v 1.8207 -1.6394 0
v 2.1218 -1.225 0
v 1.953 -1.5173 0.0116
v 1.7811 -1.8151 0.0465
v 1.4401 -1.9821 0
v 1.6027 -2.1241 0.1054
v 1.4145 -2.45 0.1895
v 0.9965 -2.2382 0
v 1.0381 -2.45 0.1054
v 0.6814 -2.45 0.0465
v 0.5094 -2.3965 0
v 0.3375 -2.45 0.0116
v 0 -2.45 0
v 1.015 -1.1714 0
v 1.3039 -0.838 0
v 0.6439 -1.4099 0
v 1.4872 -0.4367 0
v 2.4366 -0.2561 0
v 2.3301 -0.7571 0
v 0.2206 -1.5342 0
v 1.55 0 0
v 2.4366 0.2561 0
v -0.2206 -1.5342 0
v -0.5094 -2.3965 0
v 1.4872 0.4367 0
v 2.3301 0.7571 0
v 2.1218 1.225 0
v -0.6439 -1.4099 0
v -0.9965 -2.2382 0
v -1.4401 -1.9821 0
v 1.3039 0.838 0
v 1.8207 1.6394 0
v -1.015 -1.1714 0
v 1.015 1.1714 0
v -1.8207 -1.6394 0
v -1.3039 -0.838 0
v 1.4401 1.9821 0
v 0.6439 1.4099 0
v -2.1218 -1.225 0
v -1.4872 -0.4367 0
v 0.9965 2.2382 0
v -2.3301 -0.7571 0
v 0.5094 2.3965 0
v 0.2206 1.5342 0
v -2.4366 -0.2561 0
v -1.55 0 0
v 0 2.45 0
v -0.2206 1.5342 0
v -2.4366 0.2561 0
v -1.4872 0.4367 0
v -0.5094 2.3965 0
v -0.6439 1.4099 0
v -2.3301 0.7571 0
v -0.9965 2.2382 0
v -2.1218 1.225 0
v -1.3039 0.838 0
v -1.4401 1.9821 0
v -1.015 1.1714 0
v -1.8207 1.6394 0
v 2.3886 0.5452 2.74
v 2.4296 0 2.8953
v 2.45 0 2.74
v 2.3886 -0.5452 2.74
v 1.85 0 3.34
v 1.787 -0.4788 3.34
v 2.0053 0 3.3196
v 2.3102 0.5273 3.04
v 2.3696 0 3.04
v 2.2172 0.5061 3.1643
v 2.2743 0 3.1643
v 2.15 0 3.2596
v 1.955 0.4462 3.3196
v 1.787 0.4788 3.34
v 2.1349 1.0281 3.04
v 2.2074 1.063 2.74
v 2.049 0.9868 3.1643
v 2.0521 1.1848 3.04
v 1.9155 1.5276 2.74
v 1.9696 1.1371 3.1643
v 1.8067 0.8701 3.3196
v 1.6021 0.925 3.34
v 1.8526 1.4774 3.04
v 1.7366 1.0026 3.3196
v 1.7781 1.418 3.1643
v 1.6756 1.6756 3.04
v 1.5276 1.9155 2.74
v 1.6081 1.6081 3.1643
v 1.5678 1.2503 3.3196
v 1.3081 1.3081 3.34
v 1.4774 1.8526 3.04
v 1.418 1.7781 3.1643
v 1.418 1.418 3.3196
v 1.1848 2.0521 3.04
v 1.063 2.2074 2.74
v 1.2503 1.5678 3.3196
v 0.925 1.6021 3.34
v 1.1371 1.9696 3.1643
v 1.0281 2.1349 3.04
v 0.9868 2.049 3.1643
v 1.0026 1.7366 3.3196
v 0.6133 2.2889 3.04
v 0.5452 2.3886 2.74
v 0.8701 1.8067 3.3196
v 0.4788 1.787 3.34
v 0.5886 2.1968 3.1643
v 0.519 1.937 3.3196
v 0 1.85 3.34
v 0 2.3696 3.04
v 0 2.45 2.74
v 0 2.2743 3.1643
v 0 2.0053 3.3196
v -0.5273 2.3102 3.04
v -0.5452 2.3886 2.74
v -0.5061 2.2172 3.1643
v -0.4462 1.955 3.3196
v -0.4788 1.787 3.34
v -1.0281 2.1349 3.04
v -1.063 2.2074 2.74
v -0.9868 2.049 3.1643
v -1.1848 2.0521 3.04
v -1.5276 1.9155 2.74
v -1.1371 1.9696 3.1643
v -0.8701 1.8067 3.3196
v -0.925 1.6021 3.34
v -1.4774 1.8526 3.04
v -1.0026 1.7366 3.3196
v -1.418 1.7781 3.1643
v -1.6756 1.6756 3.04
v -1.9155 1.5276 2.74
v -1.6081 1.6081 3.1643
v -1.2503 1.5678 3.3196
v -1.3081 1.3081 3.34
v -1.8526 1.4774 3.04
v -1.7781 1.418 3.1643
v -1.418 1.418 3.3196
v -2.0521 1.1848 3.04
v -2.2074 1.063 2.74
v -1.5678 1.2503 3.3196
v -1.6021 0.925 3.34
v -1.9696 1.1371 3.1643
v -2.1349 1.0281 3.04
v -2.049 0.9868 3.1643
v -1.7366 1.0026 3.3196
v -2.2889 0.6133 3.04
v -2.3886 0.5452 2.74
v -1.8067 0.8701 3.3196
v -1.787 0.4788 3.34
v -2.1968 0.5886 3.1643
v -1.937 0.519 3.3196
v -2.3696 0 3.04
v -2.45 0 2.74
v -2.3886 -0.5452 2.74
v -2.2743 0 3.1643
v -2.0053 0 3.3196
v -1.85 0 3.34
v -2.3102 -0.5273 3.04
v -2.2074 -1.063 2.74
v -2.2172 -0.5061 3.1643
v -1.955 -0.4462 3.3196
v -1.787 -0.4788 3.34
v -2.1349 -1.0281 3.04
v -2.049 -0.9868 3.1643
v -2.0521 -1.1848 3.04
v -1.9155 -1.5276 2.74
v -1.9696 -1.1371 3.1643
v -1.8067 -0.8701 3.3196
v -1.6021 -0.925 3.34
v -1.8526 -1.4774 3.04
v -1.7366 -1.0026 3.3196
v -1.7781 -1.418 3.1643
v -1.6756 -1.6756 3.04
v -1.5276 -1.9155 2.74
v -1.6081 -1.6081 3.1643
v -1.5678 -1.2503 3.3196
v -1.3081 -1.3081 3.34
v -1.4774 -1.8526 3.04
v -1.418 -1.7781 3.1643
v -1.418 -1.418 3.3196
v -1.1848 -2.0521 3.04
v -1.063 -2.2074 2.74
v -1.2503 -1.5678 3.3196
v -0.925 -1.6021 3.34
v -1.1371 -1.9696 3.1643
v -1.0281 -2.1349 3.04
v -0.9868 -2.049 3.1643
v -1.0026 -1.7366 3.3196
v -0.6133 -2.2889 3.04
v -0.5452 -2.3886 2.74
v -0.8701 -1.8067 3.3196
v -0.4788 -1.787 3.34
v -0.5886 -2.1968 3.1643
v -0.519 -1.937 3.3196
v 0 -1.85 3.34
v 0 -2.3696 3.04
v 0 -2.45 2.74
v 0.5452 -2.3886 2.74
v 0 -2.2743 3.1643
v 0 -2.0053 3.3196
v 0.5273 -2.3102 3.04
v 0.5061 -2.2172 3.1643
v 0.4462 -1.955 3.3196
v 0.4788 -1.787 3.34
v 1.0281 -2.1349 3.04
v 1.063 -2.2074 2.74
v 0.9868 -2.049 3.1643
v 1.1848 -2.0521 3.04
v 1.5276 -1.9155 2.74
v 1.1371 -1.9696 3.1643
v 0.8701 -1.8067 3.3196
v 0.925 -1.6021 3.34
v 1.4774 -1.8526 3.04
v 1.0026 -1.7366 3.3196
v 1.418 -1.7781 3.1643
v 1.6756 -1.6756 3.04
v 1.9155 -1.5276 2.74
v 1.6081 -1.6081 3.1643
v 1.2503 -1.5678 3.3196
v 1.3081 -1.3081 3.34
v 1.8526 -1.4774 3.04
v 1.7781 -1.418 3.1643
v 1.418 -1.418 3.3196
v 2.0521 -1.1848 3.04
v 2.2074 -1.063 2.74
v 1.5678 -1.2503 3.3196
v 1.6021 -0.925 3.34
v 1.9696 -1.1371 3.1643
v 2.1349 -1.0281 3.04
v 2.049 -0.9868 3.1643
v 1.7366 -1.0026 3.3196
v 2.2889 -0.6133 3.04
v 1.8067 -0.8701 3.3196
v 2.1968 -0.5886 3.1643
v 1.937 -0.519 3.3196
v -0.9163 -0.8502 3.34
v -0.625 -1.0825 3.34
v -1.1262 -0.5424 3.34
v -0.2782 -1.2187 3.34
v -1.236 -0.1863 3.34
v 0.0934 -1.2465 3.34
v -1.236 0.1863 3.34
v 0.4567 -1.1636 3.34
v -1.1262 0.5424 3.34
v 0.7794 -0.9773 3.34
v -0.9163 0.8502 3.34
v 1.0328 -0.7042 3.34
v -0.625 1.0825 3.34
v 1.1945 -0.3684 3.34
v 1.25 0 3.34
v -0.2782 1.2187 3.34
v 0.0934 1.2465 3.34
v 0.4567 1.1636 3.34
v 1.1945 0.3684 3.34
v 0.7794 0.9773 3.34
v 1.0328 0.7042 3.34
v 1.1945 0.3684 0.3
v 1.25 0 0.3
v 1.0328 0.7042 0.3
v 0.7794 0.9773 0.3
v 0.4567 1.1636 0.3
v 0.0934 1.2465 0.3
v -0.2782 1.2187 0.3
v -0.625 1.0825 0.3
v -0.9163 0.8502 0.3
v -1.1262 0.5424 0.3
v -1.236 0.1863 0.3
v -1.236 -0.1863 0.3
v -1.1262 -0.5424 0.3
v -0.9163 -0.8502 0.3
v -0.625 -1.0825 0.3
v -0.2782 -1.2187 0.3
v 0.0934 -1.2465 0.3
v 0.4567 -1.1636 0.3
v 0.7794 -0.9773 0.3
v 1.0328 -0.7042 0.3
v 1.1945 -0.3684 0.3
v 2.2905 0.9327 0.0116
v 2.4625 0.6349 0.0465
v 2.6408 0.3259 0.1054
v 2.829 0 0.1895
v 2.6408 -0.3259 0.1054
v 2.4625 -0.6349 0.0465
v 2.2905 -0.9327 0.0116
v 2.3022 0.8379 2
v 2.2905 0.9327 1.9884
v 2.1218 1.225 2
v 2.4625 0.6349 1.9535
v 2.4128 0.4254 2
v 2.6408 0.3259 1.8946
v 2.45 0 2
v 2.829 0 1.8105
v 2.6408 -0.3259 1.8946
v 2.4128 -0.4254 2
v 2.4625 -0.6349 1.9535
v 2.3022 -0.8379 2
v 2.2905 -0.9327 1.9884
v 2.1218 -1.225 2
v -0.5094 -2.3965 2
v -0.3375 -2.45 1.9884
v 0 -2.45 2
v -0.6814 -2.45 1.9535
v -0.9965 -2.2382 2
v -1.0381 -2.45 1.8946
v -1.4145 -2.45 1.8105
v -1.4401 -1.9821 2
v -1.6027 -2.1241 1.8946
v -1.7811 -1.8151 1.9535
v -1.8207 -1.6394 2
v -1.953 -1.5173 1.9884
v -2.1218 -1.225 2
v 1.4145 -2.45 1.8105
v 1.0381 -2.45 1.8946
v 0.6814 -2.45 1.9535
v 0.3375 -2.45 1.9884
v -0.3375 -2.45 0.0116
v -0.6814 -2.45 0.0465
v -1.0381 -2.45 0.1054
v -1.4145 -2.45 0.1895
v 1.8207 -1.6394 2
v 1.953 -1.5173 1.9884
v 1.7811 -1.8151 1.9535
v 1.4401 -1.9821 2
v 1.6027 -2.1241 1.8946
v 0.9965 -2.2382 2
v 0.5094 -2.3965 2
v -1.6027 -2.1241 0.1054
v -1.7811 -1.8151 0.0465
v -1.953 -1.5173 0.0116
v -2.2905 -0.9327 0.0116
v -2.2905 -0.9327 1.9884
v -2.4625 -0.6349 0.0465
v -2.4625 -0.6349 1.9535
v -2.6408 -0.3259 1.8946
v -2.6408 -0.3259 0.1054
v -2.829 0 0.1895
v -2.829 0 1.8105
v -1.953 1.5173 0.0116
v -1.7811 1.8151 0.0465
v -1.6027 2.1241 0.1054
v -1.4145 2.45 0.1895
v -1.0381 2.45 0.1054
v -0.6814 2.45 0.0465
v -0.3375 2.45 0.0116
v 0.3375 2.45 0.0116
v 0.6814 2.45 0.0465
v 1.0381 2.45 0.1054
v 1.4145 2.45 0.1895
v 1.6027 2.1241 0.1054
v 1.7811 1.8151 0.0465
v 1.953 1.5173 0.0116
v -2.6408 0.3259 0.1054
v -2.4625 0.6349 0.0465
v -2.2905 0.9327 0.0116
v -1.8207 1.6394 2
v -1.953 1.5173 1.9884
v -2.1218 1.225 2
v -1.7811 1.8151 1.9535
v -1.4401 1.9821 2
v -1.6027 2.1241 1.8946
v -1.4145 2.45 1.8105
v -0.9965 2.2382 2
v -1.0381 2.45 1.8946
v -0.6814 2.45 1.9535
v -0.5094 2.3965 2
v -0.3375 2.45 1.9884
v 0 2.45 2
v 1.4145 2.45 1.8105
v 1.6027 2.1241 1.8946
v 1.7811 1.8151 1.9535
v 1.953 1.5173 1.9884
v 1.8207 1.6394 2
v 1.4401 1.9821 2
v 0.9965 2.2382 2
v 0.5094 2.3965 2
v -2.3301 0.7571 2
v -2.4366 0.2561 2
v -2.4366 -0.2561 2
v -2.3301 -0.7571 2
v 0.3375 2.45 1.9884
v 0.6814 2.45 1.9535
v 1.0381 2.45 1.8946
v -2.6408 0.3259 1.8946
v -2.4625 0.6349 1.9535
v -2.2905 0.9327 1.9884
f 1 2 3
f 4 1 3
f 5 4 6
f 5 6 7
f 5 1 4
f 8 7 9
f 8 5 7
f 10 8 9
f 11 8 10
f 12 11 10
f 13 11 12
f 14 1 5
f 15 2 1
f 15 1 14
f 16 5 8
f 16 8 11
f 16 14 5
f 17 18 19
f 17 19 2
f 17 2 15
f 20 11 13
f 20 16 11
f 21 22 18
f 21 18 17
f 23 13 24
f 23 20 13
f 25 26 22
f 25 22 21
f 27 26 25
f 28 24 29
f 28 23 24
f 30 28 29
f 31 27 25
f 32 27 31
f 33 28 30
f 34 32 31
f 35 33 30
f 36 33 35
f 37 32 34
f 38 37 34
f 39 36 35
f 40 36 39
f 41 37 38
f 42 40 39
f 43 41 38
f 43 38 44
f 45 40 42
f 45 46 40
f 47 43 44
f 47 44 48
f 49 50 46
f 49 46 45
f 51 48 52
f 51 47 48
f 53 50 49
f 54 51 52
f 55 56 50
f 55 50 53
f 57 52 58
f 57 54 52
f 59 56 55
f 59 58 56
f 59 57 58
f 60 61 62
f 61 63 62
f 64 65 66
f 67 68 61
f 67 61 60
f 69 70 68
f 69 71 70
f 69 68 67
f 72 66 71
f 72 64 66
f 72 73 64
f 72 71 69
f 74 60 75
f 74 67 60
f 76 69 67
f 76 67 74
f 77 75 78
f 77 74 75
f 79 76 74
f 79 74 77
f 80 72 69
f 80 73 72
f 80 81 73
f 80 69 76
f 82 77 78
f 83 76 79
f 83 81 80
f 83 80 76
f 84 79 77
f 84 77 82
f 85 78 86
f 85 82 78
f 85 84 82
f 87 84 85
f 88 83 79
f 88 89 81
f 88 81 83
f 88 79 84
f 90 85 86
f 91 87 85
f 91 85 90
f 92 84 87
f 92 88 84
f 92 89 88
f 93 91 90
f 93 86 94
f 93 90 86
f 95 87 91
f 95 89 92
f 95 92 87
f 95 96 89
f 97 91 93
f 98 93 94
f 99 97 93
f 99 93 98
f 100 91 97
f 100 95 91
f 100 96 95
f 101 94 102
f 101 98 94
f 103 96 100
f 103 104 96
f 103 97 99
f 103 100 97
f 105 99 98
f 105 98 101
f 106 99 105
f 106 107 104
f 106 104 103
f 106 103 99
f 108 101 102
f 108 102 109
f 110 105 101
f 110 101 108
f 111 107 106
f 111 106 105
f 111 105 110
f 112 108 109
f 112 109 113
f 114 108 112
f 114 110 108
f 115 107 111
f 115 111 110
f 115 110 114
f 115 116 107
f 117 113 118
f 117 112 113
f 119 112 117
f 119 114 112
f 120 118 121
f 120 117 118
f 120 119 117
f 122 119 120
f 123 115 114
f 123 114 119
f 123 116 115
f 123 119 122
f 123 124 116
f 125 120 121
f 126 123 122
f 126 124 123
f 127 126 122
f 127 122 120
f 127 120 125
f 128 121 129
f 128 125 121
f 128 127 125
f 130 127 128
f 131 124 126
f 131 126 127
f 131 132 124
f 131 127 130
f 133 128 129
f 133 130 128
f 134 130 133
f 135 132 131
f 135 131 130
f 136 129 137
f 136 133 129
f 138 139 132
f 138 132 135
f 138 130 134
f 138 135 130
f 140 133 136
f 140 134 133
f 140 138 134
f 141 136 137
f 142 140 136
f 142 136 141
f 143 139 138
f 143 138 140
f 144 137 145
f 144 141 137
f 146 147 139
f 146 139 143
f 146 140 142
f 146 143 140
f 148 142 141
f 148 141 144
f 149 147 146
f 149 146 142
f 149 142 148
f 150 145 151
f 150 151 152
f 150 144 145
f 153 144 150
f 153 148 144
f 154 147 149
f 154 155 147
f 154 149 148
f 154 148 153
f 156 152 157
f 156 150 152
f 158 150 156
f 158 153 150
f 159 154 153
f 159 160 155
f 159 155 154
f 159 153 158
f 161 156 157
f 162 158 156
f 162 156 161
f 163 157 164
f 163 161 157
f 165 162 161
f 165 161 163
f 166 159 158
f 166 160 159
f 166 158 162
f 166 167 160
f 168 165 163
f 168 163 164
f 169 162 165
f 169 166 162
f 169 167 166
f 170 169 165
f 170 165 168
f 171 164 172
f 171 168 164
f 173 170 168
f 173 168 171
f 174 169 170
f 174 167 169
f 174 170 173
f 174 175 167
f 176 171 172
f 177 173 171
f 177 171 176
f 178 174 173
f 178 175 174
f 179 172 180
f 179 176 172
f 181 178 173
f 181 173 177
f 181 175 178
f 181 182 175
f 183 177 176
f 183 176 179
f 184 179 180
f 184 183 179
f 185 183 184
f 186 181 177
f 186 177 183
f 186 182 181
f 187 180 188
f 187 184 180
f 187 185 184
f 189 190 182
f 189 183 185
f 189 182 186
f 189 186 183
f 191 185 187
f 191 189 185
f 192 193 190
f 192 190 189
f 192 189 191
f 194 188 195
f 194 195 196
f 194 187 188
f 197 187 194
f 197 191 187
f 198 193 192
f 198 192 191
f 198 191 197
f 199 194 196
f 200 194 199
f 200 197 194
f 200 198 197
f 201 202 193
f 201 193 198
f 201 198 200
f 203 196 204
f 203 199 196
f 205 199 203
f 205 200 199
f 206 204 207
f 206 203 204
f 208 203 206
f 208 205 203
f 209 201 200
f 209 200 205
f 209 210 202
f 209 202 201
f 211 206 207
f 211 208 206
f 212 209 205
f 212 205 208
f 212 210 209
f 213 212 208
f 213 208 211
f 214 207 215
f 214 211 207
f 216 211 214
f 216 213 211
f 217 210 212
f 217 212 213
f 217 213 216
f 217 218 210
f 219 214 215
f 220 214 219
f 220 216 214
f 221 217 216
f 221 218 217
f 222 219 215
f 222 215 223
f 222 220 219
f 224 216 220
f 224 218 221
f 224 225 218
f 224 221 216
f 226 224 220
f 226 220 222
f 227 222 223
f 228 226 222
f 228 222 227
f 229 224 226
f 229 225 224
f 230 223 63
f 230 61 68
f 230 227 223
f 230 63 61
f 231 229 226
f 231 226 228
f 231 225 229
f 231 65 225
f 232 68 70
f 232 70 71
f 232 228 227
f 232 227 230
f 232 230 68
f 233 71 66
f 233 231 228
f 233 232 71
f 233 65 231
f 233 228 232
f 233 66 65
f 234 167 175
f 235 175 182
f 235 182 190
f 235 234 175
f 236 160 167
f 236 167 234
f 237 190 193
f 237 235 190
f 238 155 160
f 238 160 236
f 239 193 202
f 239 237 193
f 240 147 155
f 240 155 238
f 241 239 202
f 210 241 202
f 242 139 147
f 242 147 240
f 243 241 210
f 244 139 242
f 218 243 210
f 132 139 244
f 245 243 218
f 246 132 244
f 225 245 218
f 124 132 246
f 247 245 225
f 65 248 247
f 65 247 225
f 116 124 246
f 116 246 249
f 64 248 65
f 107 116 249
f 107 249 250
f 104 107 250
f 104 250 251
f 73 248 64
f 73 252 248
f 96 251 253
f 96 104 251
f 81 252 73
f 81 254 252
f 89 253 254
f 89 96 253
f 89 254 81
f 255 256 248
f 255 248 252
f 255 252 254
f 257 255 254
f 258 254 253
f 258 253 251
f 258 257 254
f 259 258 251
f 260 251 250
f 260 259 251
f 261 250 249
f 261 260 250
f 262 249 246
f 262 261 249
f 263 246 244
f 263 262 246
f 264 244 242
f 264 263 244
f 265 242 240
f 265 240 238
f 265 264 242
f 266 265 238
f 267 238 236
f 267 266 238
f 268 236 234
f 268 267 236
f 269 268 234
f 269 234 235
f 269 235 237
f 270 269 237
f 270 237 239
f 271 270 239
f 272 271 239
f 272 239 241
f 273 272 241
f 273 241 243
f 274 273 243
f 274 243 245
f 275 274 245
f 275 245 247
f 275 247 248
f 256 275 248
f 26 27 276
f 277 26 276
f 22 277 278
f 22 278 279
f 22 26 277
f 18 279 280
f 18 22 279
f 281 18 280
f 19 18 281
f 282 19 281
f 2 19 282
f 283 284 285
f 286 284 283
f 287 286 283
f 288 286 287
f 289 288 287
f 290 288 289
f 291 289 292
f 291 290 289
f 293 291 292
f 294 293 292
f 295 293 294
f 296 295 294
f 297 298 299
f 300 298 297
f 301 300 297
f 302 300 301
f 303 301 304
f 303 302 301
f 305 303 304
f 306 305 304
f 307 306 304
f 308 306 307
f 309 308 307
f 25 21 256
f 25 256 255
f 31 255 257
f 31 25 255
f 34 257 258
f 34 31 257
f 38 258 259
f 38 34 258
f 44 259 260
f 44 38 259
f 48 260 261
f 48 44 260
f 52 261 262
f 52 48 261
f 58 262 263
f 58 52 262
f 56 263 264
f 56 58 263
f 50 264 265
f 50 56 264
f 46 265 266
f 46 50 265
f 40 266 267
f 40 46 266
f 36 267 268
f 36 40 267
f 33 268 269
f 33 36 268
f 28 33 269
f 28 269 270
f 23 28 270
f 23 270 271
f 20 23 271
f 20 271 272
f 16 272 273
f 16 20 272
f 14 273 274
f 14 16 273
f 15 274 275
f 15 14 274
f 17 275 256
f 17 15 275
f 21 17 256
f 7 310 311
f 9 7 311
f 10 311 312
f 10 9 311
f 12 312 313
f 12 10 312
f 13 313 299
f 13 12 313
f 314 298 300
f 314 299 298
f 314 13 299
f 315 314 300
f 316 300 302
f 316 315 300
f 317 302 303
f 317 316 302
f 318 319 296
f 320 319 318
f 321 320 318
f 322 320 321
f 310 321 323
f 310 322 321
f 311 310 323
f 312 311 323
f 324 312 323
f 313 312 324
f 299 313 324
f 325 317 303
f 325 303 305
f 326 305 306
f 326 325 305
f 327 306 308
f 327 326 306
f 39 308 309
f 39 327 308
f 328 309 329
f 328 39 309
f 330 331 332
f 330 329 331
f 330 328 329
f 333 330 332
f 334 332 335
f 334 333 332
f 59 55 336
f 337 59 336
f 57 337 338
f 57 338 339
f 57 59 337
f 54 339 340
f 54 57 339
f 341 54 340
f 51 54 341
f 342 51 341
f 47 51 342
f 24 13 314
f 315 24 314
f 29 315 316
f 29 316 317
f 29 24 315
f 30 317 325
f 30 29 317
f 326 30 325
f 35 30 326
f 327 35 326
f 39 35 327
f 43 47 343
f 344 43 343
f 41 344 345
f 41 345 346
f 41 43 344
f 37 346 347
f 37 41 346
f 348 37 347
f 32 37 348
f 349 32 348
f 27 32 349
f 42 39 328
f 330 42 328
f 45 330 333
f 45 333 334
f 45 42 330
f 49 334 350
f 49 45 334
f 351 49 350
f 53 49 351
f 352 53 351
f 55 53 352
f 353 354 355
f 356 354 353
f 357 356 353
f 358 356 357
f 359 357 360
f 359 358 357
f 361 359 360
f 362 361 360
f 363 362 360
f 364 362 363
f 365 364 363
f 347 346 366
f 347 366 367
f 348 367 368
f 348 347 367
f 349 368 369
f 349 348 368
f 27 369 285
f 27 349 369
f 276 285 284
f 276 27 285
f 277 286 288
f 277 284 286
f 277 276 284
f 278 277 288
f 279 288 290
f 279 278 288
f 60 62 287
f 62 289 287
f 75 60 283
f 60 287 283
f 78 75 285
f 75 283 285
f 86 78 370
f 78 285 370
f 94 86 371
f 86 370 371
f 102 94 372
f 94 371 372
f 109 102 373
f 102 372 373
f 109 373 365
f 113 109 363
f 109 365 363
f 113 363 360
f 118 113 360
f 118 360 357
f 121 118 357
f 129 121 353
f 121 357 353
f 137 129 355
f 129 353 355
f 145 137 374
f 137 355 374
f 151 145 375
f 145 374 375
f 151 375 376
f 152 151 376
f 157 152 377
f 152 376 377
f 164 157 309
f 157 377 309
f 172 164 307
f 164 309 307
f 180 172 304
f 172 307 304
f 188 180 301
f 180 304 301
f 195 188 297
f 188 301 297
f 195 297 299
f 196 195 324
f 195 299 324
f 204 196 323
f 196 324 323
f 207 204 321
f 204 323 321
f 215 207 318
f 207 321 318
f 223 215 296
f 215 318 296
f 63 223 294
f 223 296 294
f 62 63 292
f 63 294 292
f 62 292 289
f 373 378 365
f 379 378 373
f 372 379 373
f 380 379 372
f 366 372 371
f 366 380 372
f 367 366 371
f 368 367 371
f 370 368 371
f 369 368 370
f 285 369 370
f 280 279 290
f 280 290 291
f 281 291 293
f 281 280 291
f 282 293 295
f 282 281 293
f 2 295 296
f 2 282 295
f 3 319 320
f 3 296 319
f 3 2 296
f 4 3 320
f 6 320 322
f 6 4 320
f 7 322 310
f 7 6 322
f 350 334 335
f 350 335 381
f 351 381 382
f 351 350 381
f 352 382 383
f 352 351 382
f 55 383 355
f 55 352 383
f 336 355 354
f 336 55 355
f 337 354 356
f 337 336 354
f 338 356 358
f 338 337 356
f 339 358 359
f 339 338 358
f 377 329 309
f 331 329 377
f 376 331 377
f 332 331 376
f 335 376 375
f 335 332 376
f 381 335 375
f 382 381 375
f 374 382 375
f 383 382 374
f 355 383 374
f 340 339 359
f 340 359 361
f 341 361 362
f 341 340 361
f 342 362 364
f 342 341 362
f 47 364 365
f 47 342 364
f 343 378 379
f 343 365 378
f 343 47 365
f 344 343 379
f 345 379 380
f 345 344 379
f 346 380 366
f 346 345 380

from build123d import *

# Parameters (mm, degrees)
SKETCH1_R           = 1.25
BOSS_EXTRUDE1_DEPTH = 2
SKETCH2_R           = 2.45
SKETCH2_R_2         = 1.25
BOSS_EXTRUDE2_DEPTH = 1.34
FILLET1_R           = 0.6
CHAMFER1_SIZE       = 0.3


with BuildPart() as part:
    # Sketch1 → Boss-Extrude1 (new body)
    with BuildSketch(Plane.XY):
        Polygon((-1.41450816, 2.45), (1.41450816, 2.45), (2.829016319, 0), (1.41450816, -2.45), (-1.41450816, -2.45), (-2.829016319, 0), align=None)
        Circle(SKETCH1_R, mode=Mode.SUBTRACT)
    extrude(amount=BOSS_EXTRUDE1_DEPTH)

    # Sketch2 → Boss-Extrude2 (add)
    with BuildSketch(Plane.XY.offset(2)):
        Circle(SKETCH2_R)
        Circle(SKETCH2_R_2, mode=Mode.SUBTRACT)
    extrude(amount=BOSS_EXTRUDE2_DEPTH)

    # Fillet1
    fillet1_edges = [part.edges().sort_by_distance(p)[0] for p in [
        (-2.45, 0, 3.34),
    ]]
    fillet(fillet1_edges, radius=FILLET1_R)

    # Sketch3 → Cut-Revolve1 (revolve, cut)
    with BuildSketch(Plane(origin=(0, 0, 0), x_dir=(0, 0, -1), z_dir=(1, 0, 0))):
        Polygon((-2, 2.45), (-1.750031536, 2.95), (-0.249968464, 2.95), (0, 2.45), (0, 3.373191212), (-2, 3.373191212), align=None)
    revolve(axis=Axis((0, 0, 0), (0, 0, -1)), mode=Mode.SUBTRACT)

    # Chamfer1
    chamfer1_edges = [part.edges().sort_by_distance(p)[0] for p in [
        (-1.25, 0, 0),
    ]]
    chamfer(chamfer1_edges, length=CHAMFER1_SIZE)


solid = part.part
